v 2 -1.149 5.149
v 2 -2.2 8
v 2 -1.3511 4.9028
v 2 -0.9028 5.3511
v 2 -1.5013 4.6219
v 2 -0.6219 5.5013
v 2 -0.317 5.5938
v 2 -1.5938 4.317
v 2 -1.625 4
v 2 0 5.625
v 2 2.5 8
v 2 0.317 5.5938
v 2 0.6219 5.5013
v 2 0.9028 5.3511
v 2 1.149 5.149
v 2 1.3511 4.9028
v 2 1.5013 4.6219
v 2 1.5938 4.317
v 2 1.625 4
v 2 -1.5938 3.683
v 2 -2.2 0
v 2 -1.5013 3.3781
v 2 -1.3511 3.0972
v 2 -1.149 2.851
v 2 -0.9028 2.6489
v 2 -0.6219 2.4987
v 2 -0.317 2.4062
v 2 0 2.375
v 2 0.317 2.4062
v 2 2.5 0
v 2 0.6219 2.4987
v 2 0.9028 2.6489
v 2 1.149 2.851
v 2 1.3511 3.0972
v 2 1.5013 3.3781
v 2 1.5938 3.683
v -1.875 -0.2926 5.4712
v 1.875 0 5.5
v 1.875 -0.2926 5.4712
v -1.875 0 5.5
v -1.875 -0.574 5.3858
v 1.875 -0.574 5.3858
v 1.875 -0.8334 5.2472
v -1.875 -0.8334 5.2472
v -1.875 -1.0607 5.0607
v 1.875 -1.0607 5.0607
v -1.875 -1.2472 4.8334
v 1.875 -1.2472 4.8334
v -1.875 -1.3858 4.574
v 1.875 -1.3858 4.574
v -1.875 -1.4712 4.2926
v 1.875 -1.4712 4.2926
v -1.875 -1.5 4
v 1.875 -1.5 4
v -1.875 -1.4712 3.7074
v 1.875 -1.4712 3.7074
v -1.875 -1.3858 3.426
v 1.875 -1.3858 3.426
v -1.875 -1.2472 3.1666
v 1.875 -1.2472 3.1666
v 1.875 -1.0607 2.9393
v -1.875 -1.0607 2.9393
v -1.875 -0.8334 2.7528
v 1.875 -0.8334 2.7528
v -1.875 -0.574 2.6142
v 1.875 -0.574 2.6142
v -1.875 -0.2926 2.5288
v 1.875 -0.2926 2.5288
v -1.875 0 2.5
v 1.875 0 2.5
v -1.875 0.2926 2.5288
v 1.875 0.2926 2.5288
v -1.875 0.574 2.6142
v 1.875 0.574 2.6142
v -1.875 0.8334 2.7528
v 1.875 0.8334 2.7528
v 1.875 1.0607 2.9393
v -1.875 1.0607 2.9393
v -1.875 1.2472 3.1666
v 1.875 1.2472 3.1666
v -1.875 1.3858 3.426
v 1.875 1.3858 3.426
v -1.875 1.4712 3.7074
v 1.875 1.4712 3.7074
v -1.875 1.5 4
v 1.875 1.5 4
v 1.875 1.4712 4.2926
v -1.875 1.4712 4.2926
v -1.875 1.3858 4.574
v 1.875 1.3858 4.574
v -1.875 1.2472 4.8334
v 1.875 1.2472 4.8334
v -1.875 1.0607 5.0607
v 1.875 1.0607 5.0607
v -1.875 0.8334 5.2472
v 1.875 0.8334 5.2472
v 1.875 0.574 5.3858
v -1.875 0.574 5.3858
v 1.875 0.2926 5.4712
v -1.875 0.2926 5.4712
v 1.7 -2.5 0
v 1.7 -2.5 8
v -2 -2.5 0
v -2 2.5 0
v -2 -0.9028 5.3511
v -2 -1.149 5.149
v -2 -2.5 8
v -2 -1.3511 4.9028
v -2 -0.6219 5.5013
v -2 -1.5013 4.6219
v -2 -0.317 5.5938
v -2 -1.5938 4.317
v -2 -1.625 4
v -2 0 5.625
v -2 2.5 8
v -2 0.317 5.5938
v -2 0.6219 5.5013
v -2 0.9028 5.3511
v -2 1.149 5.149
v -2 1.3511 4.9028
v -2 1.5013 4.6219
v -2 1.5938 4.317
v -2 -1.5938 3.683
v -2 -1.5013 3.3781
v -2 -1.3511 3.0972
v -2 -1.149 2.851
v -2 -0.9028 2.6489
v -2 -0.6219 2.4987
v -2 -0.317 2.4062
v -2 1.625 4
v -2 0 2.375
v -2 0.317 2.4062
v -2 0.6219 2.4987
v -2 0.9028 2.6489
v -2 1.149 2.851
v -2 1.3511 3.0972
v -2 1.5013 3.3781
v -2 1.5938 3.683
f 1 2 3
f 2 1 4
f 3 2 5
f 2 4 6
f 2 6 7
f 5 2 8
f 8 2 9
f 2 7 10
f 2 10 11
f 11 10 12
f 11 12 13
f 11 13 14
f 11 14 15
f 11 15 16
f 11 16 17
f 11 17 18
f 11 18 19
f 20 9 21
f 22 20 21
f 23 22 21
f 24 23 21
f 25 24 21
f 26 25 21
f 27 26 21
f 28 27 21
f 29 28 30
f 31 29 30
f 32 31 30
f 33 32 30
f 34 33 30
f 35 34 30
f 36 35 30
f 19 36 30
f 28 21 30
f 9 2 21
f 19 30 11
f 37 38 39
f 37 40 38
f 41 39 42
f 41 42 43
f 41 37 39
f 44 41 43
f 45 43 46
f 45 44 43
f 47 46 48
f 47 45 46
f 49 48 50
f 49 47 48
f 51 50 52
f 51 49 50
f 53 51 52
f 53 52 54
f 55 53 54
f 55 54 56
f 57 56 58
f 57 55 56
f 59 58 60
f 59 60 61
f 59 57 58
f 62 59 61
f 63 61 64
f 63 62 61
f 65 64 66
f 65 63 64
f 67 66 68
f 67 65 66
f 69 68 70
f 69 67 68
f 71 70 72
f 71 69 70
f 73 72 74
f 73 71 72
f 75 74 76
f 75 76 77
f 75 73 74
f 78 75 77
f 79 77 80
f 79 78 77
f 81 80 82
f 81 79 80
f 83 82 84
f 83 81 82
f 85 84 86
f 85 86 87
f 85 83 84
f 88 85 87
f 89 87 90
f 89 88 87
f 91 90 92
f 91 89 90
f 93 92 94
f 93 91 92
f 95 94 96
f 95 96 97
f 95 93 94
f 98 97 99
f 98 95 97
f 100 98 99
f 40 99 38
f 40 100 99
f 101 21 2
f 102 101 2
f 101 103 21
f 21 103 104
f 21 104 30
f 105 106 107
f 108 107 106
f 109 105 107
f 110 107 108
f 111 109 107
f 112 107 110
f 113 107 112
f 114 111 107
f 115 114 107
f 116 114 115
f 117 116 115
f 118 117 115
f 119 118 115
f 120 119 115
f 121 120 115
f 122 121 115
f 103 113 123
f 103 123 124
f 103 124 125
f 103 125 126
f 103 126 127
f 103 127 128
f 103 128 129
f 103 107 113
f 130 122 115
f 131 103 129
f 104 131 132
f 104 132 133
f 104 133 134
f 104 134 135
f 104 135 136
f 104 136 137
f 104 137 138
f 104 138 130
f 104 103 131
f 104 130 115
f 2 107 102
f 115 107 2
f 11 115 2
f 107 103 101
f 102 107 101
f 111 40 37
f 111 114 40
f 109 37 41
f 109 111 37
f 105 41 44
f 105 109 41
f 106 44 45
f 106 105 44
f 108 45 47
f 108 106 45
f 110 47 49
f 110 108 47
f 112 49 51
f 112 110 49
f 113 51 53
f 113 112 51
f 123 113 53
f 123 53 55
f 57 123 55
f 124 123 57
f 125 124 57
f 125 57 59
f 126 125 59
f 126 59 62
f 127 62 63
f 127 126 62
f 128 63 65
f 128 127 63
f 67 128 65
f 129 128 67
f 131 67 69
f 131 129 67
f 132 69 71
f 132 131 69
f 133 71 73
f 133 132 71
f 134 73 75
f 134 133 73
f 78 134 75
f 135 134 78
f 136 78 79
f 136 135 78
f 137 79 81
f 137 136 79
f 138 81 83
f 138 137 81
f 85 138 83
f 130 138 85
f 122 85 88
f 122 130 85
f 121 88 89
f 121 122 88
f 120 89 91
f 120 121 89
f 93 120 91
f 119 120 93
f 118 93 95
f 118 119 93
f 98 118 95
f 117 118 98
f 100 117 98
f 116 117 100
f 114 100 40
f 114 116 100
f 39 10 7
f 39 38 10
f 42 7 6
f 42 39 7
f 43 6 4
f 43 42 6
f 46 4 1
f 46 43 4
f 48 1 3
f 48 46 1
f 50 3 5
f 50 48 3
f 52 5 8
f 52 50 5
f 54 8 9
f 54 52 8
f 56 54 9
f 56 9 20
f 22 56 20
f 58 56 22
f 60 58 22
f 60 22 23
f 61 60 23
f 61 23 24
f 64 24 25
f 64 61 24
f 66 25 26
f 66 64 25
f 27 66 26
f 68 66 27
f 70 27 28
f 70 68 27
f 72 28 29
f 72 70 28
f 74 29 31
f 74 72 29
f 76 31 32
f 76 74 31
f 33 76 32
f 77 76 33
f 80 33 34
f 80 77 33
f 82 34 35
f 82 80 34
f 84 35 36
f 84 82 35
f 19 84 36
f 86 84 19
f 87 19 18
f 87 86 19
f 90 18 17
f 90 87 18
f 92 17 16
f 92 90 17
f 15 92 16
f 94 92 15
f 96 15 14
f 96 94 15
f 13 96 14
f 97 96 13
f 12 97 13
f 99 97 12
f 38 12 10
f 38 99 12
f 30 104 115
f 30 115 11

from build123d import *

# Parameters (mm, degrees)
SKETCH_1_W      = 4
SKETCH_1_H      = 5
EXTRUDE_1_DEPTH = 8
CHAMFER_1_SIZE  = 0.3


with BuildPart() as part:
    # Эскиз1 → Бобышка-Вытянуть1 (new body)
    with BuildSketch(Plane.XY):
        Rectangle(SKETCH_1_W, SKETCH_1_H)
    extrude(amount=EXTRUDE_1_DEPTH)

    # Эскиз2 → Отверстие обработанное метчиком M31 (revolve, cut)
    with BuildSketch(Plane(origin=(-2, 0, 4), x_dir=(0, 0, 1), z_dir=(0, 1, 0))):
        Polygon((0, 0), (0, 4), (1.625, 4), (1.5, 3.875), (1.5, 0.125), (1.625, 0), align=None)
    revolve(axis=Axis((-8.35, 0, 4), (1, 0, 0)), mode=Mode.SUBTRACT)

    # Фаска1
    chamfer_1_edges = [part.edges().sort_by_distance(p)[0] for p in [
        (2, -2.5, 4),
    ]]
    chamfer(chamfer_1_edges, length=CHAMFER_1_SIZE)


solid = part.part
